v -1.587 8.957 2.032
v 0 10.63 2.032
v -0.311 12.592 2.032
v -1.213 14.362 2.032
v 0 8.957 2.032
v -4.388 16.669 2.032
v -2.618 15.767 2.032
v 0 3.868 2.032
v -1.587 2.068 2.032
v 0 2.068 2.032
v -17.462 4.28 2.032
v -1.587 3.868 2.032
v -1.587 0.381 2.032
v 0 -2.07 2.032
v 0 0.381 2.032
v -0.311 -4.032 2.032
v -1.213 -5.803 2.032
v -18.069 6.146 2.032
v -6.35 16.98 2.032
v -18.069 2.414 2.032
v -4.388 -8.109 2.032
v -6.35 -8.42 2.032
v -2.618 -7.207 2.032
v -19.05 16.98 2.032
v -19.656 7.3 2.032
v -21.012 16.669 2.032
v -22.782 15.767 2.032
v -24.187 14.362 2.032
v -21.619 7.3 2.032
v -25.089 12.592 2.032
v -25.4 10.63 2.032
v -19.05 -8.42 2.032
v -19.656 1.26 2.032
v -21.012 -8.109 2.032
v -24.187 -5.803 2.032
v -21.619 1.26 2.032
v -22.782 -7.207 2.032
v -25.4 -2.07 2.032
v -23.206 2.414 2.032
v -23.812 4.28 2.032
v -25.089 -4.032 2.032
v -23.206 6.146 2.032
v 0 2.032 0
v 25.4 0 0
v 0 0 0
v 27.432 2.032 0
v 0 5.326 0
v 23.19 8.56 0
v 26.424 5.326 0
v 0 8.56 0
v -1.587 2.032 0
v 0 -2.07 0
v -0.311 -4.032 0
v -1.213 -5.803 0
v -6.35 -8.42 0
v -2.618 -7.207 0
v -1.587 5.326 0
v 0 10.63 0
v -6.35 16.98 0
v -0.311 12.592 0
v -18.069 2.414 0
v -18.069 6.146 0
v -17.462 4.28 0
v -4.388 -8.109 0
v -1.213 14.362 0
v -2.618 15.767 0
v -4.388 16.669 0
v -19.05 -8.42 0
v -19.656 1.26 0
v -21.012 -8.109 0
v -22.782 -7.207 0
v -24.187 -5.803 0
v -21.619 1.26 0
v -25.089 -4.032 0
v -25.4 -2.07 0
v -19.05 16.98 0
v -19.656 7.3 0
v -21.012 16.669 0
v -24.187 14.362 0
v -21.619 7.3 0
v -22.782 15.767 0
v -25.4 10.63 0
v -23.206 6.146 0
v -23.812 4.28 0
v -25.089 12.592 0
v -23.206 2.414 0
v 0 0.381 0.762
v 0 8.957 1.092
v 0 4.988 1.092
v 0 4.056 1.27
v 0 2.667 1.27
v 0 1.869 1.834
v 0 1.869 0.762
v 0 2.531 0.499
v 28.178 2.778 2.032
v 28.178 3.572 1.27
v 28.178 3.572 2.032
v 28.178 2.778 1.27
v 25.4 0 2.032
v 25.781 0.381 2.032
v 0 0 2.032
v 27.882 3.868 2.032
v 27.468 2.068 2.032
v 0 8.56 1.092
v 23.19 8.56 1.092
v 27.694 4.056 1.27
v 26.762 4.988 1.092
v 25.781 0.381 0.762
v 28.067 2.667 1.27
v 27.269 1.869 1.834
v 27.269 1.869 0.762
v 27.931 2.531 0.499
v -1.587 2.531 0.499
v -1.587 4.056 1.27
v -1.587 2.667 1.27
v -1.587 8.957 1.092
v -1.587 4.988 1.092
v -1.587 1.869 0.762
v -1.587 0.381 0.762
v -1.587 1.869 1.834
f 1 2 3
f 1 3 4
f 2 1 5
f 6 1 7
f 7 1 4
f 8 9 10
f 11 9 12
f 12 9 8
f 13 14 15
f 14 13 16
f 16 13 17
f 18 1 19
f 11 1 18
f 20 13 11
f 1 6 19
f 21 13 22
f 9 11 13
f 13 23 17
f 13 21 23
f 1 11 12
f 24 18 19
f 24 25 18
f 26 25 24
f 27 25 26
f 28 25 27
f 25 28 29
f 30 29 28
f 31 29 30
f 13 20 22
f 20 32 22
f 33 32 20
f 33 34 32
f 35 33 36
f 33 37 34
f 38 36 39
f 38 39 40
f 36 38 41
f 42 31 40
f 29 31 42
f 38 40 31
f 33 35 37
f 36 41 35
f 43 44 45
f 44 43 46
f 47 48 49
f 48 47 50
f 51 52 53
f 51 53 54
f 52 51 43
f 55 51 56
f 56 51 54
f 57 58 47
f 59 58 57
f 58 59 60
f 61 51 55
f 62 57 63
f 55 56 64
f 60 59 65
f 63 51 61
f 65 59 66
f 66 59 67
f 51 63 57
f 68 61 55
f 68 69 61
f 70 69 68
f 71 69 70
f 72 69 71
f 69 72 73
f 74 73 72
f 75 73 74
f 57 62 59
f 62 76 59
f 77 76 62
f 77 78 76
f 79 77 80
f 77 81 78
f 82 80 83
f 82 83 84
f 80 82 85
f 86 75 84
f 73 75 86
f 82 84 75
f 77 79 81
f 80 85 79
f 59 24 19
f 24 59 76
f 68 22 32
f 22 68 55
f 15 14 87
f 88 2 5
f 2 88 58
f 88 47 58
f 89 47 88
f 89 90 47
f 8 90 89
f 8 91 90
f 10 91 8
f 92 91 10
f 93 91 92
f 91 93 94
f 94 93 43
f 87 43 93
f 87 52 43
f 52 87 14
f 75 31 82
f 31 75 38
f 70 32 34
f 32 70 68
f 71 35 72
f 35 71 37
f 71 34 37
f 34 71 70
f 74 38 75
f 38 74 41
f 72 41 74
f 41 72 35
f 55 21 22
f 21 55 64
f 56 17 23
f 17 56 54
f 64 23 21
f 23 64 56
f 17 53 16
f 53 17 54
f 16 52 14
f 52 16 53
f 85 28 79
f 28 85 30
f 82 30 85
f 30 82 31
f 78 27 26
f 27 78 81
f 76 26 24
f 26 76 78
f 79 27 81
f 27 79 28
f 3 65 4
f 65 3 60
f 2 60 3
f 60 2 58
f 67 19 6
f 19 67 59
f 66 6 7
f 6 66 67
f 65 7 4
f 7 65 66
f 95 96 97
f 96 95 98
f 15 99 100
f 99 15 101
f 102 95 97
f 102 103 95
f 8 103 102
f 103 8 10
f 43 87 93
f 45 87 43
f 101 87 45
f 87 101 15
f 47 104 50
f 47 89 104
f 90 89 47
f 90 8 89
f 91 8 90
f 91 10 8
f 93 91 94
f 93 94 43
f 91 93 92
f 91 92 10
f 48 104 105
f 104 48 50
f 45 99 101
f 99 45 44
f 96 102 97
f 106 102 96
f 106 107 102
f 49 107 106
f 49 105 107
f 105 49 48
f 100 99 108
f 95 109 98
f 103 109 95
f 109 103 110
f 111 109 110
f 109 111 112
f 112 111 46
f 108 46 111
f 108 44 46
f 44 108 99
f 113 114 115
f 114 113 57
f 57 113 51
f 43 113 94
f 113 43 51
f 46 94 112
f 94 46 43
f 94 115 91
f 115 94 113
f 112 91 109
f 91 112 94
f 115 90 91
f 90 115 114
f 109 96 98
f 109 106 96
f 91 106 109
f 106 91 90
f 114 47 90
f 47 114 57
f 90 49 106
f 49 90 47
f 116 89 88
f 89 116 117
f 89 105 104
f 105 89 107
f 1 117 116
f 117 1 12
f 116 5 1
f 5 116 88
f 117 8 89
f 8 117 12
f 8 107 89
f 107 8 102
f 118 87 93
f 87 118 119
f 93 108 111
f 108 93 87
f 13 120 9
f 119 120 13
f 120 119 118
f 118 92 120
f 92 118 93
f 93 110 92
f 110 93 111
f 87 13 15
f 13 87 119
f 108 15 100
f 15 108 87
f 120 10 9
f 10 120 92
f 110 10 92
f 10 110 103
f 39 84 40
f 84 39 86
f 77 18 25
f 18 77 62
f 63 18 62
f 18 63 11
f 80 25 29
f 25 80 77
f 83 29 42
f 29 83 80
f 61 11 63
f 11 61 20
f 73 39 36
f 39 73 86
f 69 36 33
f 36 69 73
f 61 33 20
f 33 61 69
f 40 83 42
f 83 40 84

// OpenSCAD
// Physical Keygen - by Nirav Patel <http://eclecti.cc>
//
// Generate a duplicate of a Kwikset KW1 key by editing the last line of the file
// and entering in the key code of the lock.  If you don't know the key code,
// you can measure the key and compare the numbers at:
// http://web.archive.org/web/20050217020917fw_/http://dlaco.com/spacing/tips.htm
//
// This work is licensed under a Creative Commons Attribution 3.0 Unported License.

// Since the keys and locks I have were all designed in imperial units, the
// constants in this file will be defined in inches.  The mm function
// allows us to retain the proper size for exporting a metric STL.
function mm(i) = i*25.4;

module rounded(size, r) {
    union() {
        translate([r, 0, 0]) cube([size[0]-2*r, size[1], size[2]]);
        translate([0, r, 0]) cube([size[0], size[1]-2*r, size[2]]);
        translate([r, r, 0]) cylinder(h=size[2], r=r);
        translate([size[0]-r, r, 0]) cylinder(h=size[2], r=r);
        translate([r, size[1]-r, 0]) cylinder(h=size[2], r=r);
        translate([size[0]-r, size[1]-r, 0]) cylinder(h=size[2], r=r);
    }
}

module bit(bitw) {
//bitw was 128
    w = mm(1/4);
    difference() {
        translate([-w/2, 0, 0]) cube([w, mm(1), w]);
        translate([-mm(5/bitw), 0, 0]) rotate([0, 0, 135]) cube([w, w, w]);
        translate([mm(5/bitw), 0, 0]) rotate([0, 0, -45]) cube([w, w, w]);
    }
}

// Kwikset KW1 5 pin key.  The measurements are mostly guesses based on reverse
// engineering some keys I have and some publicly available information.
module KW1(switch,bits) {

    usebitting = (switch == "code");
    makebump = (switch == "bump");


    // You may need to adjust these to fit your specific printer settings
    thickness = mm(0.080);
    length = mm(9/8);
    width = mm(.337);
    
    shoulder = mm(.247);
    pin_spacing = mm(.15);
    depth_inc = mm(.023);
    
    // A fudge factor.  Printing with your average RepRap, the bottom layer is
    // going to be squeezed larger than you want. You can make the pins
    // go slighly deeper by a fudge amount to make up for it if you aren't
    // adjusting for it elsewhere like Skeinforge or in your firmware.
    fudge = 0.5;
    
    // Handle size
    h_l = mm(1);
    h_w = mm(1);
    h_d = mm(1/16);
    difference() {
        // blade and key handle
        union() {
            translate([-h_l, -h_w/2 + width/2, 0]) rounded([h_l, h_w, thickness], mm(1/4));
            // cut a little off the tip to avoid going too long
            cube([length - mm(1/64), width, thickness]);
        }
        
        // chamfer the tip
        translate([length, mm(1/8), 0]) {
            rotate([0, 0, 45]) cube([10, 10, thickness]);
            rotate([0, 0, 225]) cube([10, 10, thickness]);
        }
        
        // put in a hole for keychain use
        translate([-h_l + mm(3/16), width/2, 0]) cylinder(h=thickness, r=mm(1/8));
        
        // cut the channels in the key.  designed more for printability than accuracy
        union() {
            translate([-h_d, mm(.105), mm(.025)]) rotate([225, 0, 0]) cube([length + h_d, width, width]);
            translate([-h_d, mm(.105), mm(.05)]) rotate([260, 0, 0]) cube([length + h_d, thickness/2, mm(1/32)]);
            translate([-h_d, mm(.105), 0]) cube([length + h_d, mm(7/128), mm(.05)]);
            translate([-h_d, mm(.105) + mm(7/128), mm(.05)]) rotate([225, 0, 0]) cube([length + h_d, mm(3/64), thickness]);
        }
        
        translate([-h_d, width - mm(9/64), mm(.043)]) {
            cube([length + h_d, width - (width - mm(10/64)), thickness]);
            rotate([50, 0, 0]) cube([length + h_d, width, thickness]);
        }
        
        union() {
            translate([-h_d, mm(0.015), mm(.03)]) cube([length + h_d, mm(15/256), thickness]);
            translate([-h_d, mm(0.015) + mm(13/256), thickness - mm(1/64)]) rotate([45, 0, 0]) cube([length + h_d, mm(1/16), mm(1/16)]);
        }

        // Do the actual bitting
       if (usebitting) {
           for (b = [0:4]) {
                // KW1 doesn't have a 0 value and instead has 1 start around .008" deep
                translate([shoulder + fudge + b*pin_spacing, width - mm(.008) - (bits[b] - 1)*depth_inc - fudge, 0]) bit(128);
           }
       }
	  if (makebump) {
           //for (b = [0:5]) {
                // KW1 doesn't have a 0 value and instead has 1 start around .008" deep
                translate([shoulder + fudge + 0*pin_spacing, width - mm(.008) - (bits[0] - 1)*depth_inc - fudge, 0]) bit(512);
                translate([shoulder + fudge + 1*pin_spacing, width - mm(.008) - (bits[1] - 1)*depth_inc - fudge, 0]) bit(512);
                translate([shoulder + fudge + 2*pin_spacing, width - mm(.008) - (bits[2] - 1)*depth_inc - fudge, 0]) bit(512);
                translate([shoulder + fudge + 3*pin_spacing, width - mm(.008) - (bits[3] - 1)*depth_inc - fudge, 0]) bit(512);
                translate([shoulder + fudge + 4*pin_spacing, width - mm(.008) - (bits[4] - 1)*depth_inc - fudge, 0]) bit(512);
                translate([shoulder + fudge + 5*pin_spacing, width - mm(.008) - (bits[4] - 1)*depth_inc - fudge, 0]) bit(512);
           //}
       }

    }
}


//KW1("blank",[7,7,7,7,7,7]);

KW1("blank",[0,0,0,0,0]);
